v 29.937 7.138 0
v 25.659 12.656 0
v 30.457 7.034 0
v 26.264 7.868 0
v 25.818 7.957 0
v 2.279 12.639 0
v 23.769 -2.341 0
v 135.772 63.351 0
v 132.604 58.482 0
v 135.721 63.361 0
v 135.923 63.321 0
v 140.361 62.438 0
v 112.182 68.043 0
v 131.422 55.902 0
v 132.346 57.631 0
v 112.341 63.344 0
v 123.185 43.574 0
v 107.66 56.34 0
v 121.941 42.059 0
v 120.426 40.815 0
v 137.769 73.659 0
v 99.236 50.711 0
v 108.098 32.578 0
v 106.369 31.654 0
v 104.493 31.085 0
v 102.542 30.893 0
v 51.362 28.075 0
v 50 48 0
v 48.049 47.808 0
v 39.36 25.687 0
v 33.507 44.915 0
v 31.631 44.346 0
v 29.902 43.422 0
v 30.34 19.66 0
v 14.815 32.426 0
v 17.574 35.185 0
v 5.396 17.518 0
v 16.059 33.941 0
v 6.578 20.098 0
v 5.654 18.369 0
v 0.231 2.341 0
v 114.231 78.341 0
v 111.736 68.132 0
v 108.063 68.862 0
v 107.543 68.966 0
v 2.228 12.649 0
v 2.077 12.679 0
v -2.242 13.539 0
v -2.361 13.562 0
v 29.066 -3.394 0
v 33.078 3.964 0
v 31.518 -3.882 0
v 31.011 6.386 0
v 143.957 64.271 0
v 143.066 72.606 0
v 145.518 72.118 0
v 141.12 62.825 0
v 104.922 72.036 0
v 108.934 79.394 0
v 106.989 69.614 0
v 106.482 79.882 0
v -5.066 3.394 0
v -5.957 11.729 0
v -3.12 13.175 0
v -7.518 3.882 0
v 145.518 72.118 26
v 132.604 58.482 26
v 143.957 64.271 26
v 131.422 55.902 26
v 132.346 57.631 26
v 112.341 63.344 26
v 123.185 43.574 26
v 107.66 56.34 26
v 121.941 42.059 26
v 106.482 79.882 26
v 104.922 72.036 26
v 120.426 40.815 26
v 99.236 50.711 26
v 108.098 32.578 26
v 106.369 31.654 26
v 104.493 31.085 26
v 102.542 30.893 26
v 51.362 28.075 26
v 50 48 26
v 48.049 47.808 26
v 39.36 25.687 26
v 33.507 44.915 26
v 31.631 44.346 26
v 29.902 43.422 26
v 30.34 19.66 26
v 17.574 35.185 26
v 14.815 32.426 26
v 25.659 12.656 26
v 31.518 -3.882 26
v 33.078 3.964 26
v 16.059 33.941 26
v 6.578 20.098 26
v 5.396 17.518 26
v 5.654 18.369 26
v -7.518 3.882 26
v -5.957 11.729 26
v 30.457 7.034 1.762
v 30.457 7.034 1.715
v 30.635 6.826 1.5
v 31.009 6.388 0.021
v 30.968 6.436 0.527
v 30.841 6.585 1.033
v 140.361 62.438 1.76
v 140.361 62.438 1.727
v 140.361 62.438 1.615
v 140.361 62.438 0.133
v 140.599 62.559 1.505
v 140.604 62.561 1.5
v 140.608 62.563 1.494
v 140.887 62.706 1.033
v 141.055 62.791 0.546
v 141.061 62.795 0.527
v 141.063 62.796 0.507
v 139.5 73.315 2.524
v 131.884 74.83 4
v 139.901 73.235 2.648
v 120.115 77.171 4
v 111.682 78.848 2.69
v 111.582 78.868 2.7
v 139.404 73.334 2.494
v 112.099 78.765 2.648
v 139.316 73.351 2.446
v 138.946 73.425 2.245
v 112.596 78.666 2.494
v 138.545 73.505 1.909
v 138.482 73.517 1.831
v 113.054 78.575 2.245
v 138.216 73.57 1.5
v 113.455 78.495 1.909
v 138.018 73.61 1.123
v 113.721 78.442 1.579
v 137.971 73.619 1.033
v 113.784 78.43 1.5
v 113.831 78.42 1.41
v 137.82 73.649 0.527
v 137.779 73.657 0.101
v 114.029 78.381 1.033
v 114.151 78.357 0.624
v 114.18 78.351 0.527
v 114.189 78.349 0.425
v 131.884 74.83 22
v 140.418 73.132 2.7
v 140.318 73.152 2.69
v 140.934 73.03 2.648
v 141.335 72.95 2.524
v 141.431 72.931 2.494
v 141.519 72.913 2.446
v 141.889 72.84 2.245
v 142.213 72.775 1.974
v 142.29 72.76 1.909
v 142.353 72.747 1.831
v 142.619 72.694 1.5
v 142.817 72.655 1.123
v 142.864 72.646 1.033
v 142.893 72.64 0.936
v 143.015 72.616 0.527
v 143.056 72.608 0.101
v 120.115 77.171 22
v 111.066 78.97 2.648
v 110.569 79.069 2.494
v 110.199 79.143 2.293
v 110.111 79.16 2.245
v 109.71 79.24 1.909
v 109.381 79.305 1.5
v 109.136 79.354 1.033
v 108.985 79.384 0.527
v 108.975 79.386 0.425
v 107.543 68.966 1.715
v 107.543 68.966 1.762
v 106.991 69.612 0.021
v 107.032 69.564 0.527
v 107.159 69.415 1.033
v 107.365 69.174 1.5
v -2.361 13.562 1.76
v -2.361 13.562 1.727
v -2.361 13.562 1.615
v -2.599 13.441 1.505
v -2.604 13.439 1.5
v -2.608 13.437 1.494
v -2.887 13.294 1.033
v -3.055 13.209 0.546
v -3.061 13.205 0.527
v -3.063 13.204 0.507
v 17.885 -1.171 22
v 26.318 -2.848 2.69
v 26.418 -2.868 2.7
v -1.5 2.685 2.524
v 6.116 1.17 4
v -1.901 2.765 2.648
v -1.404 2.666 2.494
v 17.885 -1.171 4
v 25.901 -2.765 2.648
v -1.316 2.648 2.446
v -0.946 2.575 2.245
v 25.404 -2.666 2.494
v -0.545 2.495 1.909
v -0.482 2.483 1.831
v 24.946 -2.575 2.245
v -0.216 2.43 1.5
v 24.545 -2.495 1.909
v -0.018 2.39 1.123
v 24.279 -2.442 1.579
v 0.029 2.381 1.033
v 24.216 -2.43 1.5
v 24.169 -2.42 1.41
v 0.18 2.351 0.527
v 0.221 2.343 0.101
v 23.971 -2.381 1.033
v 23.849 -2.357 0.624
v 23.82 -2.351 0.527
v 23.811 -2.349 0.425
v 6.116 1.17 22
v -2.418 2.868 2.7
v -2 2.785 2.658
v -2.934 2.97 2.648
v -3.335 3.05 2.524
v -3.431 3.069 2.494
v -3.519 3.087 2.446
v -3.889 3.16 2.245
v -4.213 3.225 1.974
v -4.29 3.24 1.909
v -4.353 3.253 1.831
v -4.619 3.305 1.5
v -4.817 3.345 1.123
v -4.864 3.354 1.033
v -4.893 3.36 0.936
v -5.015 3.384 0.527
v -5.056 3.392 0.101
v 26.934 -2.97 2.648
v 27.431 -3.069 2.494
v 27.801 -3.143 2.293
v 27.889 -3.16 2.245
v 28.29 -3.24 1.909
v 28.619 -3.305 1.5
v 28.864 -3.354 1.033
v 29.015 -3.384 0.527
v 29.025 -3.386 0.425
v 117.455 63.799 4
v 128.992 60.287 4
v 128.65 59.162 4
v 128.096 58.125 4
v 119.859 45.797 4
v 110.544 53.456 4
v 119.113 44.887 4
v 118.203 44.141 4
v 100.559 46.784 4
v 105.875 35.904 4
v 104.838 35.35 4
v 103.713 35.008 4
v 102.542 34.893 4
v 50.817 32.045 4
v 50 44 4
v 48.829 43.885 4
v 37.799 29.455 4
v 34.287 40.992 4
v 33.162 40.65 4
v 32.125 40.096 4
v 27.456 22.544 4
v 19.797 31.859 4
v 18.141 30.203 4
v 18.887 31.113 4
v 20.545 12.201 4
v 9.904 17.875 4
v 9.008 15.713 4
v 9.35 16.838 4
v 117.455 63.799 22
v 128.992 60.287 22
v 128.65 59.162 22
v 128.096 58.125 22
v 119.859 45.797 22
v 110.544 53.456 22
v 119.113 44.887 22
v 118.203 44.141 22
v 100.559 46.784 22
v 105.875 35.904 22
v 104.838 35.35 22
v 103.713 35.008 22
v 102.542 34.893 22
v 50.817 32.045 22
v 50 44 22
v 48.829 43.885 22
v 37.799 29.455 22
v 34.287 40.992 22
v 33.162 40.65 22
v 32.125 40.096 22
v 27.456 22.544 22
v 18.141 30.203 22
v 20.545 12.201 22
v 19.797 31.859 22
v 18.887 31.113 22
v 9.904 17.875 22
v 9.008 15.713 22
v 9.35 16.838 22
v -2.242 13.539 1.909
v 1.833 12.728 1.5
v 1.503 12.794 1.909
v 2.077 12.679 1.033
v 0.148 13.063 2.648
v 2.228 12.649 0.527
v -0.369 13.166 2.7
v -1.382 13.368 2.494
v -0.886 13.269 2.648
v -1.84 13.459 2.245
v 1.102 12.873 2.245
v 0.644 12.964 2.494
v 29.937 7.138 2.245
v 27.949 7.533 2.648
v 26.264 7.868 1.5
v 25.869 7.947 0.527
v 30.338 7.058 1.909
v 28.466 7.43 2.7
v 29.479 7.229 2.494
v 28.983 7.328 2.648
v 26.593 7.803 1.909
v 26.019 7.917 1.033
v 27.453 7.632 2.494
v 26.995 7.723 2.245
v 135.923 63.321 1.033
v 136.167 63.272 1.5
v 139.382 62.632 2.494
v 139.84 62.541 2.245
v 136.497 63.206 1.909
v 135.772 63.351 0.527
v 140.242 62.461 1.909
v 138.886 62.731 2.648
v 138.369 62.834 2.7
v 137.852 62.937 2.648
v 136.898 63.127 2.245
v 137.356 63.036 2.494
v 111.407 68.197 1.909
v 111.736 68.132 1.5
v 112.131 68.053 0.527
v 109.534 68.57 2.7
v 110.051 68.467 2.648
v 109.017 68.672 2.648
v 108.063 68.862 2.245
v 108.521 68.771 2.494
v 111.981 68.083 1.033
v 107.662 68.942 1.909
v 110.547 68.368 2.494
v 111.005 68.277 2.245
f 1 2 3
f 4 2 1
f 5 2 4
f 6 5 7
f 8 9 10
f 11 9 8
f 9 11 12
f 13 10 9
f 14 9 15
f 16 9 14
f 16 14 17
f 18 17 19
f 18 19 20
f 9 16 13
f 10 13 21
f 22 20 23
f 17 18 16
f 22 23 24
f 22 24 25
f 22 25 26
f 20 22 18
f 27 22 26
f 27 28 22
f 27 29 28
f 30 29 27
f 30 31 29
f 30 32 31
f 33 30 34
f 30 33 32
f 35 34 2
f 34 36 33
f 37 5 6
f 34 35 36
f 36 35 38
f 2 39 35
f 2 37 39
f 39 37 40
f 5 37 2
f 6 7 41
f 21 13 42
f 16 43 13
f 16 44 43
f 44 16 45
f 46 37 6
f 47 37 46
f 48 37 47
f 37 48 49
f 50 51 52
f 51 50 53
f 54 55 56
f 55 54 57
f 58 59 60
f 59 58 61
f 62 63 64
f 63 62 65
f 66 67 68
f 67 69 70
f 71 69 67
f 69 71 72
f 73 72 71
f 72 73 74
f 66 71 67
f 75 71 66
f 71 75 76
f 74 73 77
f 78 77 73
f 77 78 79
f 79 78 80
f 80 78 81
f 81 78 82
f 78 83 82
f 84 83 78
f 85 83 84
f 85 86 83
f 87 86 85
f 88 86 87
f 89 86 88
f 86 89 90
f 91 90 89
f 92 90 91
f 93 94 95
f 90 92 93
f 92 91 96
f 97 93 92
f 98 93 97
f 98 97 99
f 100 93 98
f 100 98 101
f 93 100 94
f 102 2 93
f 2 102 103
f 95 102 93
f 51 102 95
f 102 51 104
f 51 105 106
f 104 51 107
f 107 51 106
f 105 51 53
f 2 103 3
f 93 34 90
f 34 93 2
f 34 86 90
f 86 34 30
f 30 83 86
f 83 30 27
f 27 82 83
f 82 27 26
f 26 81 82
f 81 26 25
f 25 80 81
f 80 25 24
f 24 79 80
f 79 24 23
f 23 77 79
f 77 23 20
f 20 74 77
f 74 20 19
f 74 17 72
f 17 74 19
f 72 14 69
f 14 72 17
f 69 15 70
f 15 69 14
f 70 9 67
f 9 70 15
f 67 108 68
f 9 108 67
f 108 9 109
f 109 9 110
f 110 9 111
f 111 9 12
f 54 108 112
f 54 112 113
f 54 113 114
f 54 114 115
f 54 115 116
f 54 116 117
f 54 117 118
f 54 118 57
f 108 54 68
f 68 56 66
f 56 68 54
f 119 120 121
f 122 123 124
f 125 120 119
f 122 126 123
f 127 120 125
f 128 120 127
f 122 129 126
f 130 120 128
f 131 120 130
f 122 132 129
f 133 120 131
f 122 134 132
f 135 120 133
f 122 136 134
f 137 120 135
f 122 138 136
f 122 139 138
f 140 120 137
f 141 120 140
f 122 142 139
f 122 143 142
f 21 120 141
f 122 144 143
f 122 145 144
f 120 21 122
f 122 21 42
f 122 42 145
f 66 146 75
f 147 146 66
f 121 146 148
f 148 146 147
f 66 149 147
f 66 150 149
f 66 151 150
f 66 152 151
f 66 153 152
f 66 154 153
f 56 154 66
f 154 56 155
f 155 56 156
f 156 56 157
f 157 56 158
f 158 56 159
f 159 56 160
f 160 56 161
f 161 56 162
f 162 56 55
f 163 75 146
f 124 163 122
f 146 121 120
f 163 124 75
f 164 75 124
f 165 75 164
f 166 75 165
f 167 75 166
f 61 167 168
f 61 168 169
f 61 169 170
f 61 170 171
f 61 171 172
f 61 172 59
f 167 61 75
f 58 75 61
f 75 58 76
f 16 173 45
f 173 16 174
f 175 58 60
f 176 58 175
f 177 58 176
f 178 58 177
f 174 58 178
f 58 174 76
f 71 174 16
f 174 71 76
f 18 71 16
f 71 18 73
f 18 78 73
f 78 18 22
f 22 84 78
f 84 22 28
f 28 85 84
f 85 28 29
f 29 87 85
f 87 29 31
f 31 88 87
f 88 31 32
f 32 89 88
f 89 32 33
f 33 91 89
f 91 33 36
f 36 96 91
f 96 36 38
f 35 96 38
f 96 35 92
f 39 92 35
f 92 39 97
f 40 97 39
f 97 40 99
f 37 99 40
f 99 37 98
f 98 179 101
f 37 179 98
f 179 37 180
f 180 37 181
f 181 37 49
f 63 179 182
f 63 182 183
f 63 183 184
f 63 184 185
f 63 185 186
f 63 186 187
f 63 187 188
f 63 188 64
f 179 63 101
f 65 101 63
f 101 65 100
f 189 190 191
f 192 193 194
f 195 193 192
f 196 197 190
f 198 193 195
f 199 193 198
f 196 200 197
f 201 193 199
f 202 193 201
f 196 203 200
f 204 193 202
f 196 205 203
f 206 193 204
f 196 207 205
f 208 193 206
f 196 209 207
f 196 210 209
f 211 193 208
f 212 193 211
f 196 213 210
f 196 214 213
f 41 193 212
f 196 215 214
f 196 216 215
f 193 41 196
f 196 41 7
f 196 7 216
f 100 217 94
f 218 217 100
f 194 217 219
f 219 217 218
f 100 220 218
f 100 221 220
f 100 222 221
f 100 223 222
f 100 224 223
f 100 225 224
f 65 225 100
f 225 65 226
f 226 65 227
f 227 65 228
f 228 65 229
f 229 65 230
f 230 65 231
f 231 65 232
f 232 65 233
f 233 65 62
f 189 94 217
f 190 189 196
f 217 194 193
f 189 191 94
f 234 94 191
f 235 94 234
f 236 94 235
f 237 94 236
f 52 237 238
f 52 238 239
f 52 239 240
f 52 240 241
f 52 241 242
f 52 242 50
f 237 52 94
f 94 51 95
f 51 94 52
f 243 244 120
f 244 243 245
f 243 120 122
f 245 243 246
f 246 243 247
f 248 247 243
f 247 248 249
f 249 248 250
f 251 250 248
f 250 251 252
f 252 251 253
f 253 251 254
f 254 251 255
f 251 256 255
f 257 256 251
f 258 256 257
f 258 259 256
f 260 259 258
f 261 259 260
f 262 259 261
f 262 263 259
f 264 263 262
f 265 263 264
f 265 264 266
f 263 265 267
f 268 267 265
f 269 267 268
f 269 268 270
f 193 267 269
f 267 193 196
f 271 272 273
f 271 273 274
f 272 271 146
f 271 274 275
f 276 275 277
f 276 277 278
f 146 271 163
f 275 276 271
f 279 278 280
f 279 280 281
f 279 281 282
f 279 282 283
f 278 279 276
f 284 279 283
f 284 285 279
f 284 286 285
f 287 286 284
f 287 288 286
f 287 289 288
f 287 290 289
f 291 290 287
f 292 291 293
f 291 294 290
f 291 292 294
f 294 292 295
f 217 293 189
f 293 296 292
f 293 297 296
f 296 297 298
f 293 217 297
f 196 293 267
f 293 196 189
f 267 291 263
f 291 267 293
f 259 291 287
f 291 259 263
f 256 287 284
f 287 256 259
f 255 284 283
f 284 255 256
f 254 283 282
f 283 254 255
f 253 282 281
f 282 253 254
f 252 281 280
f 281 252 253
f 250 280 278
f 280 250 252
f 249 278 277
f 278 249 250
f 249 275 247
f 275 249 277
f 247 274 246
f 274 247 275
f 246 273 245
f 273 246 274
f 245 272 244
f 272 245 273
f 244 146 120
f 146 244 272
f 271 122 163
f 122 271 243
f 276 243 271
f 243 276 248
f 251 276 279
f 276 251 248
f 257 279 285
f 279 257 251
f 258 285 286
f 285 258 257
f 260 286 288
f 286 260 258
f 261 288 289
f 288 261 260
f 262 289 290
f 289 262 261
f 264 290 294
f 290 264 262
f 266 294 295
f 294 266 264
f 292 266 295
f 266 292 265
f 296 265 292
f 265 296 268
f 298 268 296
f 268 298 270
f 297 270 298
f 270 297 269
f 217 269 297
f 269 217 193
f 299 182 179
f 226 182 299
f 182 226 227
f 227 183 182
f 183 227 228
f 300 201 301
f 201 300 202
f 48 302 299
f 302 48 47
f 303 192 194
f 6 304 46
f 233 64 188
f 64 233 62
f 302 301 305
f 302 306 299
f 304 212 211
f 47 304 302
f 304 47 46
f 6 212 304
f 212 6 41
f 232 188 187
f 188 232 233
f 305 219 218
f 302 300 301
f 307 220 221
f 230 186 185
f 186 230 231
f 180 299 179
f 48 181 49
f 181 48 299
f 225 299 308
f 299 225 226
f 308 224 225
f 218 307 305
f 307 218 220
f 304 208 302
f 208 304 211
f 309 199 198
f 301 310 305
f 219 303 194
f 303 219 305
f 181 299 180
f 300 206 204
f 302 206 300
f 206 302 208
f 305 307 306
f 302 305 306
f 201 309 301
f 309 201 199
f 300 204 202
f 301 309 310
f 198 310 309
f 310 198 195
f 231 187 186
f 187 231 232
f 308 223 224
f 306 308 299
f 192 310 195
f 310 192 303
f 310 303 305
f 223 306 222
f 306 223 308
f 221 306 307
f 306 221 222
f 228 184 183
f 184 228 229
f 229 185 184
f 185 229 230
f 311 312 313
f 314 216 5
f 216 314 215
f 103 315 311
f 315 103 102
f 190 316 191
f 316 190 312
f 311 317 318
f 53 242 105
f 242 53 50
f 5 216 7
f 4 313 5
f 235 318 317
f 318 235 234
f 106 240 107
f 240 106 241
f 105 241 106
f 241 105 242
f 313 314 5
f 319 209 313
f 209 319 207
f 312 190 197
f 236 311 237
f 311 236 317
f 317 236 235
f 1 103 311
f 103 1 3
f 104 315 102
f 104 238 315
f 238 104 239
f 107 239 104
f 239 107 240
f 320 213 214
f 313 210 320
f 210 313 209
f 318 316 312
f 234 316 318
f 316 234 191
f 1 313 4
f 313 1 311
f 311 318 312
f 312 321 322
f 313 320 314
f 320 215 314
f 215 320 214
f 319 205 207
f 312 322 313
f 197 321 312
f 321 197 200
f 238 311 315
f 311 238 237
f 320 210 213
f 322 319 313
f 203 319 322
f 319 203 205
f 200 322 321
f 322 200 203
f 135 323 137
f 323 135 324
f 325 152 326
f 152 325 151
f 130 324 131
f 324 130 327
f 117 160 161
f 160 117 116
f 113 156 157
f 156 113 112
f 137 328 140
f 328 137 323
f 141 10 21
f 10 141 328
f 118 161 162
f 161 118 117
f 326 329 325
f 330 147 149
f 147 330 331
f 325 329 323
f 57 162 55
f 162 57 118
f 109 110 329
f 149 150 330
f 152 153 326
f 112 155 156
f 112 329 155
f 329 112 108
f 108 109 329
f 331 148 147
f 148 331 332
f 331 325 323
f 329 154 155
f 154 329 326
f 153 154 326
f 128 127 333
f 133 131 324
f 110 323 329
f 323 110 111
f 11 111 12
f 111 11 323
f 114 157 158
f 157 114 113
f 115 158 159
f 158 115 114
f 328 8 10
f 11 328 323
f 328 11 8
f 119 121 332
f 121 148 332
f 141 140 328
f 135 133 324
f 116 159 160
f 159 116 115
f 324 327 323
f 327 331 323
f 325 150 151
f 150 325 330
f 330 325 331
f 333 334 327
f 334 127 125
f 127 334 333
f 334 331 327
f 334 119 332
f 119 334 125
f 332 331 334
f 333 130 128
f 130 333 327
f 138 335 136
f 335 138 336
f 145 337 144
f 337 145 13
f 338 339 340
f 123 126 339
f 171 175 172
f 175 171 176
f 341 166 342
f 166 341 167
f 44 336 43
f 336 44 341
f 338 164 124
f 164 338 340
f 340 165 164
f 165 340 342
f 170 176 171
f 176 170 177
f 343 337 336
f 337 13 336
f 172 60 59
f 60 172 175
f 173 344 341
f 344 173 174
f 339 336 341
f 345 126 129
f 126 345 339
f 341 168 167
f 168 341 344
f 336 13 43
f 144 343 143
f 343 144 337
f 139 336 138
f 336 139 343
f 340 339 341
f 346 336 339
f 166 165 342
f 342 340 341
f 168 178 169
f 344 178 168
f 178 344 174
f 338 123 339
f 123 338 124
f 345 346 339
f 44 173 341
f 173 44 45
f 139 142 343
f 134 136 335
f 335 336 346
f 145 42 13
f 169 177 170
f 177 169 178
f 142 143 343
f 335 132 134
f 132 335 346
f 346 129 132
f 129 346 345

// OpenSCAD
$fn = 32;

// ----------------------------------------------------------------------
// Air duct: 20 mm duct, 4 mm wall, 26 mm across
// ----------------------------------------------------------------------

// --- parameters (mm) ---
duct_r = 10;              // duct core radius
duct_d = 20;              // duct core diameter
wall = 4;                 // duct wall thickness
height = 26;              // duct width (extrusion height)
port_r = 19.9;            // port flange half width
port_d = 39.8;            // port flange width
port_t = 8;               // port flange thickness
bolt_d = 5.4;             // port bolt holes
bolt_offset = 14.7;       // bolt hole offset from the port axis

difference() {
  /* outer hull chain: tube with a flat flange plate at every port */
  linear_extrude(height = 26) {
    hull() {
      polygon([[31.518, -3.882], [-7.518, 3.882], [-5.957, 11.729], [33.078, 3.964]]);
      translate([14.146, 10.789]) circle(r = 10);
    }
    hull() {
      translate([14.146, 10.789]) circle(r = 10);
      translate([14.893, 14.542]) circle(r = 10);
    }
    hull() {
      translate([14.893, 14.542]) circle(r = 10);
      translate([23.13, 26.87]) circle(r = 10);
    }
    hull() {
      translate([23.13, 26.87]) circle(r = 10);
      translate([35.458, 35.107]) circle(r = 10);
    }
    hull() {
      translate([35.458, 35.107]) circle(r = 10);
      translate([50, 38]) circle(r = 10);
    }
    hull() {
      translate([50, 38]) circle(r = 10);
      translate([102.542, 40.893]) circle(r = 10);
    }
    hull() {
      translate([102.542, 40.893]) circle(r = 10);
      translate([114.87, 49.13]) circle(r = 10);
    }
    hull() {
      translate([114.87, 49.13]) circle(r = 10);
      translate([123.107, 61.458]) circle(r = 10);
    }
    hull() {
      translate([123.107, 61.458]) circle(r = 10);
      translate([123.854, 65.211]) circle(r = 10);
    }
    hull() {
      translate([123.854, 65.211]) circle(r = 10);
      polygon([[106.482, 79.882], [145.518, 72.118], [143.957, 64.271], [104.922, 72.036]]);
    }
  }
  /* air passage: the same chain inset by the wall, 5 mm proud of the ports */
  translate([0, 0, 4]) linear_extrude(height = 18) {
    hull() {
      translate([11.025, -4.904]) circle(r = 6);
      translate([14.893, 14.542]) circle(r = 6);
    }
    hull() {
      translate([14.893, 14.542]) circle(r = 6);
      translate([23.13, 26.87]) circle(r = 6);
    }
    hull() {
      translate([23.13, 26.87]) circle(r = 6);
      translate([35.458, 35.107]) circle(r = 6);
    }
    hull() {
      translate([35.458, 35.107]) circle(r = 6);
      translate([50, 38]) circle(r = 6);
    }
    hull() {
      translate([50, 38]) circle(r = 6);
      translate([102.542, 40.893]) circle(r = 6);
    }
    hull() {
      translate([102.542, 40.893]) circle(r = 6);
      translate([114.87, 49.13]) circle(r = 6);
    }
    hull() {
      translate([114.87, 49.13]) circle(r = 6);
      translate([123.107, 61.458]) circle(r = 6);
    }
    hull() {
      translate([123.107, 61.458]) circle(r = 6);
      translate([126.975, 80.904]) circle(r = 6);
    }
  }
  translate([12, 0]) rotate([0, 0, -11.25]) translate([-14.7, -2.5]) rotate([-90, 0, 0]) cylinder(h = 13, d = 5.4);
  translate([12, 0]) rotate([0, 0, -11.25]) translate([14.7, -2.5]) rotate([-90, 0, 0]) cylinder(h = 13, d = 5.4);
  translate([126, 76]) rotate([0, 0, 168.75]) translate([-14.7, -2.5]) rotate([-90, 0, 0]) cylinder(h = 13, d = 5.4);
  translate([126, 76]) rotate([0, 0, 168.75]) translate([14.7, -2.5]) rotate([-90, 0, 0]) cylinder(h = 13, d = 5.4);
}
